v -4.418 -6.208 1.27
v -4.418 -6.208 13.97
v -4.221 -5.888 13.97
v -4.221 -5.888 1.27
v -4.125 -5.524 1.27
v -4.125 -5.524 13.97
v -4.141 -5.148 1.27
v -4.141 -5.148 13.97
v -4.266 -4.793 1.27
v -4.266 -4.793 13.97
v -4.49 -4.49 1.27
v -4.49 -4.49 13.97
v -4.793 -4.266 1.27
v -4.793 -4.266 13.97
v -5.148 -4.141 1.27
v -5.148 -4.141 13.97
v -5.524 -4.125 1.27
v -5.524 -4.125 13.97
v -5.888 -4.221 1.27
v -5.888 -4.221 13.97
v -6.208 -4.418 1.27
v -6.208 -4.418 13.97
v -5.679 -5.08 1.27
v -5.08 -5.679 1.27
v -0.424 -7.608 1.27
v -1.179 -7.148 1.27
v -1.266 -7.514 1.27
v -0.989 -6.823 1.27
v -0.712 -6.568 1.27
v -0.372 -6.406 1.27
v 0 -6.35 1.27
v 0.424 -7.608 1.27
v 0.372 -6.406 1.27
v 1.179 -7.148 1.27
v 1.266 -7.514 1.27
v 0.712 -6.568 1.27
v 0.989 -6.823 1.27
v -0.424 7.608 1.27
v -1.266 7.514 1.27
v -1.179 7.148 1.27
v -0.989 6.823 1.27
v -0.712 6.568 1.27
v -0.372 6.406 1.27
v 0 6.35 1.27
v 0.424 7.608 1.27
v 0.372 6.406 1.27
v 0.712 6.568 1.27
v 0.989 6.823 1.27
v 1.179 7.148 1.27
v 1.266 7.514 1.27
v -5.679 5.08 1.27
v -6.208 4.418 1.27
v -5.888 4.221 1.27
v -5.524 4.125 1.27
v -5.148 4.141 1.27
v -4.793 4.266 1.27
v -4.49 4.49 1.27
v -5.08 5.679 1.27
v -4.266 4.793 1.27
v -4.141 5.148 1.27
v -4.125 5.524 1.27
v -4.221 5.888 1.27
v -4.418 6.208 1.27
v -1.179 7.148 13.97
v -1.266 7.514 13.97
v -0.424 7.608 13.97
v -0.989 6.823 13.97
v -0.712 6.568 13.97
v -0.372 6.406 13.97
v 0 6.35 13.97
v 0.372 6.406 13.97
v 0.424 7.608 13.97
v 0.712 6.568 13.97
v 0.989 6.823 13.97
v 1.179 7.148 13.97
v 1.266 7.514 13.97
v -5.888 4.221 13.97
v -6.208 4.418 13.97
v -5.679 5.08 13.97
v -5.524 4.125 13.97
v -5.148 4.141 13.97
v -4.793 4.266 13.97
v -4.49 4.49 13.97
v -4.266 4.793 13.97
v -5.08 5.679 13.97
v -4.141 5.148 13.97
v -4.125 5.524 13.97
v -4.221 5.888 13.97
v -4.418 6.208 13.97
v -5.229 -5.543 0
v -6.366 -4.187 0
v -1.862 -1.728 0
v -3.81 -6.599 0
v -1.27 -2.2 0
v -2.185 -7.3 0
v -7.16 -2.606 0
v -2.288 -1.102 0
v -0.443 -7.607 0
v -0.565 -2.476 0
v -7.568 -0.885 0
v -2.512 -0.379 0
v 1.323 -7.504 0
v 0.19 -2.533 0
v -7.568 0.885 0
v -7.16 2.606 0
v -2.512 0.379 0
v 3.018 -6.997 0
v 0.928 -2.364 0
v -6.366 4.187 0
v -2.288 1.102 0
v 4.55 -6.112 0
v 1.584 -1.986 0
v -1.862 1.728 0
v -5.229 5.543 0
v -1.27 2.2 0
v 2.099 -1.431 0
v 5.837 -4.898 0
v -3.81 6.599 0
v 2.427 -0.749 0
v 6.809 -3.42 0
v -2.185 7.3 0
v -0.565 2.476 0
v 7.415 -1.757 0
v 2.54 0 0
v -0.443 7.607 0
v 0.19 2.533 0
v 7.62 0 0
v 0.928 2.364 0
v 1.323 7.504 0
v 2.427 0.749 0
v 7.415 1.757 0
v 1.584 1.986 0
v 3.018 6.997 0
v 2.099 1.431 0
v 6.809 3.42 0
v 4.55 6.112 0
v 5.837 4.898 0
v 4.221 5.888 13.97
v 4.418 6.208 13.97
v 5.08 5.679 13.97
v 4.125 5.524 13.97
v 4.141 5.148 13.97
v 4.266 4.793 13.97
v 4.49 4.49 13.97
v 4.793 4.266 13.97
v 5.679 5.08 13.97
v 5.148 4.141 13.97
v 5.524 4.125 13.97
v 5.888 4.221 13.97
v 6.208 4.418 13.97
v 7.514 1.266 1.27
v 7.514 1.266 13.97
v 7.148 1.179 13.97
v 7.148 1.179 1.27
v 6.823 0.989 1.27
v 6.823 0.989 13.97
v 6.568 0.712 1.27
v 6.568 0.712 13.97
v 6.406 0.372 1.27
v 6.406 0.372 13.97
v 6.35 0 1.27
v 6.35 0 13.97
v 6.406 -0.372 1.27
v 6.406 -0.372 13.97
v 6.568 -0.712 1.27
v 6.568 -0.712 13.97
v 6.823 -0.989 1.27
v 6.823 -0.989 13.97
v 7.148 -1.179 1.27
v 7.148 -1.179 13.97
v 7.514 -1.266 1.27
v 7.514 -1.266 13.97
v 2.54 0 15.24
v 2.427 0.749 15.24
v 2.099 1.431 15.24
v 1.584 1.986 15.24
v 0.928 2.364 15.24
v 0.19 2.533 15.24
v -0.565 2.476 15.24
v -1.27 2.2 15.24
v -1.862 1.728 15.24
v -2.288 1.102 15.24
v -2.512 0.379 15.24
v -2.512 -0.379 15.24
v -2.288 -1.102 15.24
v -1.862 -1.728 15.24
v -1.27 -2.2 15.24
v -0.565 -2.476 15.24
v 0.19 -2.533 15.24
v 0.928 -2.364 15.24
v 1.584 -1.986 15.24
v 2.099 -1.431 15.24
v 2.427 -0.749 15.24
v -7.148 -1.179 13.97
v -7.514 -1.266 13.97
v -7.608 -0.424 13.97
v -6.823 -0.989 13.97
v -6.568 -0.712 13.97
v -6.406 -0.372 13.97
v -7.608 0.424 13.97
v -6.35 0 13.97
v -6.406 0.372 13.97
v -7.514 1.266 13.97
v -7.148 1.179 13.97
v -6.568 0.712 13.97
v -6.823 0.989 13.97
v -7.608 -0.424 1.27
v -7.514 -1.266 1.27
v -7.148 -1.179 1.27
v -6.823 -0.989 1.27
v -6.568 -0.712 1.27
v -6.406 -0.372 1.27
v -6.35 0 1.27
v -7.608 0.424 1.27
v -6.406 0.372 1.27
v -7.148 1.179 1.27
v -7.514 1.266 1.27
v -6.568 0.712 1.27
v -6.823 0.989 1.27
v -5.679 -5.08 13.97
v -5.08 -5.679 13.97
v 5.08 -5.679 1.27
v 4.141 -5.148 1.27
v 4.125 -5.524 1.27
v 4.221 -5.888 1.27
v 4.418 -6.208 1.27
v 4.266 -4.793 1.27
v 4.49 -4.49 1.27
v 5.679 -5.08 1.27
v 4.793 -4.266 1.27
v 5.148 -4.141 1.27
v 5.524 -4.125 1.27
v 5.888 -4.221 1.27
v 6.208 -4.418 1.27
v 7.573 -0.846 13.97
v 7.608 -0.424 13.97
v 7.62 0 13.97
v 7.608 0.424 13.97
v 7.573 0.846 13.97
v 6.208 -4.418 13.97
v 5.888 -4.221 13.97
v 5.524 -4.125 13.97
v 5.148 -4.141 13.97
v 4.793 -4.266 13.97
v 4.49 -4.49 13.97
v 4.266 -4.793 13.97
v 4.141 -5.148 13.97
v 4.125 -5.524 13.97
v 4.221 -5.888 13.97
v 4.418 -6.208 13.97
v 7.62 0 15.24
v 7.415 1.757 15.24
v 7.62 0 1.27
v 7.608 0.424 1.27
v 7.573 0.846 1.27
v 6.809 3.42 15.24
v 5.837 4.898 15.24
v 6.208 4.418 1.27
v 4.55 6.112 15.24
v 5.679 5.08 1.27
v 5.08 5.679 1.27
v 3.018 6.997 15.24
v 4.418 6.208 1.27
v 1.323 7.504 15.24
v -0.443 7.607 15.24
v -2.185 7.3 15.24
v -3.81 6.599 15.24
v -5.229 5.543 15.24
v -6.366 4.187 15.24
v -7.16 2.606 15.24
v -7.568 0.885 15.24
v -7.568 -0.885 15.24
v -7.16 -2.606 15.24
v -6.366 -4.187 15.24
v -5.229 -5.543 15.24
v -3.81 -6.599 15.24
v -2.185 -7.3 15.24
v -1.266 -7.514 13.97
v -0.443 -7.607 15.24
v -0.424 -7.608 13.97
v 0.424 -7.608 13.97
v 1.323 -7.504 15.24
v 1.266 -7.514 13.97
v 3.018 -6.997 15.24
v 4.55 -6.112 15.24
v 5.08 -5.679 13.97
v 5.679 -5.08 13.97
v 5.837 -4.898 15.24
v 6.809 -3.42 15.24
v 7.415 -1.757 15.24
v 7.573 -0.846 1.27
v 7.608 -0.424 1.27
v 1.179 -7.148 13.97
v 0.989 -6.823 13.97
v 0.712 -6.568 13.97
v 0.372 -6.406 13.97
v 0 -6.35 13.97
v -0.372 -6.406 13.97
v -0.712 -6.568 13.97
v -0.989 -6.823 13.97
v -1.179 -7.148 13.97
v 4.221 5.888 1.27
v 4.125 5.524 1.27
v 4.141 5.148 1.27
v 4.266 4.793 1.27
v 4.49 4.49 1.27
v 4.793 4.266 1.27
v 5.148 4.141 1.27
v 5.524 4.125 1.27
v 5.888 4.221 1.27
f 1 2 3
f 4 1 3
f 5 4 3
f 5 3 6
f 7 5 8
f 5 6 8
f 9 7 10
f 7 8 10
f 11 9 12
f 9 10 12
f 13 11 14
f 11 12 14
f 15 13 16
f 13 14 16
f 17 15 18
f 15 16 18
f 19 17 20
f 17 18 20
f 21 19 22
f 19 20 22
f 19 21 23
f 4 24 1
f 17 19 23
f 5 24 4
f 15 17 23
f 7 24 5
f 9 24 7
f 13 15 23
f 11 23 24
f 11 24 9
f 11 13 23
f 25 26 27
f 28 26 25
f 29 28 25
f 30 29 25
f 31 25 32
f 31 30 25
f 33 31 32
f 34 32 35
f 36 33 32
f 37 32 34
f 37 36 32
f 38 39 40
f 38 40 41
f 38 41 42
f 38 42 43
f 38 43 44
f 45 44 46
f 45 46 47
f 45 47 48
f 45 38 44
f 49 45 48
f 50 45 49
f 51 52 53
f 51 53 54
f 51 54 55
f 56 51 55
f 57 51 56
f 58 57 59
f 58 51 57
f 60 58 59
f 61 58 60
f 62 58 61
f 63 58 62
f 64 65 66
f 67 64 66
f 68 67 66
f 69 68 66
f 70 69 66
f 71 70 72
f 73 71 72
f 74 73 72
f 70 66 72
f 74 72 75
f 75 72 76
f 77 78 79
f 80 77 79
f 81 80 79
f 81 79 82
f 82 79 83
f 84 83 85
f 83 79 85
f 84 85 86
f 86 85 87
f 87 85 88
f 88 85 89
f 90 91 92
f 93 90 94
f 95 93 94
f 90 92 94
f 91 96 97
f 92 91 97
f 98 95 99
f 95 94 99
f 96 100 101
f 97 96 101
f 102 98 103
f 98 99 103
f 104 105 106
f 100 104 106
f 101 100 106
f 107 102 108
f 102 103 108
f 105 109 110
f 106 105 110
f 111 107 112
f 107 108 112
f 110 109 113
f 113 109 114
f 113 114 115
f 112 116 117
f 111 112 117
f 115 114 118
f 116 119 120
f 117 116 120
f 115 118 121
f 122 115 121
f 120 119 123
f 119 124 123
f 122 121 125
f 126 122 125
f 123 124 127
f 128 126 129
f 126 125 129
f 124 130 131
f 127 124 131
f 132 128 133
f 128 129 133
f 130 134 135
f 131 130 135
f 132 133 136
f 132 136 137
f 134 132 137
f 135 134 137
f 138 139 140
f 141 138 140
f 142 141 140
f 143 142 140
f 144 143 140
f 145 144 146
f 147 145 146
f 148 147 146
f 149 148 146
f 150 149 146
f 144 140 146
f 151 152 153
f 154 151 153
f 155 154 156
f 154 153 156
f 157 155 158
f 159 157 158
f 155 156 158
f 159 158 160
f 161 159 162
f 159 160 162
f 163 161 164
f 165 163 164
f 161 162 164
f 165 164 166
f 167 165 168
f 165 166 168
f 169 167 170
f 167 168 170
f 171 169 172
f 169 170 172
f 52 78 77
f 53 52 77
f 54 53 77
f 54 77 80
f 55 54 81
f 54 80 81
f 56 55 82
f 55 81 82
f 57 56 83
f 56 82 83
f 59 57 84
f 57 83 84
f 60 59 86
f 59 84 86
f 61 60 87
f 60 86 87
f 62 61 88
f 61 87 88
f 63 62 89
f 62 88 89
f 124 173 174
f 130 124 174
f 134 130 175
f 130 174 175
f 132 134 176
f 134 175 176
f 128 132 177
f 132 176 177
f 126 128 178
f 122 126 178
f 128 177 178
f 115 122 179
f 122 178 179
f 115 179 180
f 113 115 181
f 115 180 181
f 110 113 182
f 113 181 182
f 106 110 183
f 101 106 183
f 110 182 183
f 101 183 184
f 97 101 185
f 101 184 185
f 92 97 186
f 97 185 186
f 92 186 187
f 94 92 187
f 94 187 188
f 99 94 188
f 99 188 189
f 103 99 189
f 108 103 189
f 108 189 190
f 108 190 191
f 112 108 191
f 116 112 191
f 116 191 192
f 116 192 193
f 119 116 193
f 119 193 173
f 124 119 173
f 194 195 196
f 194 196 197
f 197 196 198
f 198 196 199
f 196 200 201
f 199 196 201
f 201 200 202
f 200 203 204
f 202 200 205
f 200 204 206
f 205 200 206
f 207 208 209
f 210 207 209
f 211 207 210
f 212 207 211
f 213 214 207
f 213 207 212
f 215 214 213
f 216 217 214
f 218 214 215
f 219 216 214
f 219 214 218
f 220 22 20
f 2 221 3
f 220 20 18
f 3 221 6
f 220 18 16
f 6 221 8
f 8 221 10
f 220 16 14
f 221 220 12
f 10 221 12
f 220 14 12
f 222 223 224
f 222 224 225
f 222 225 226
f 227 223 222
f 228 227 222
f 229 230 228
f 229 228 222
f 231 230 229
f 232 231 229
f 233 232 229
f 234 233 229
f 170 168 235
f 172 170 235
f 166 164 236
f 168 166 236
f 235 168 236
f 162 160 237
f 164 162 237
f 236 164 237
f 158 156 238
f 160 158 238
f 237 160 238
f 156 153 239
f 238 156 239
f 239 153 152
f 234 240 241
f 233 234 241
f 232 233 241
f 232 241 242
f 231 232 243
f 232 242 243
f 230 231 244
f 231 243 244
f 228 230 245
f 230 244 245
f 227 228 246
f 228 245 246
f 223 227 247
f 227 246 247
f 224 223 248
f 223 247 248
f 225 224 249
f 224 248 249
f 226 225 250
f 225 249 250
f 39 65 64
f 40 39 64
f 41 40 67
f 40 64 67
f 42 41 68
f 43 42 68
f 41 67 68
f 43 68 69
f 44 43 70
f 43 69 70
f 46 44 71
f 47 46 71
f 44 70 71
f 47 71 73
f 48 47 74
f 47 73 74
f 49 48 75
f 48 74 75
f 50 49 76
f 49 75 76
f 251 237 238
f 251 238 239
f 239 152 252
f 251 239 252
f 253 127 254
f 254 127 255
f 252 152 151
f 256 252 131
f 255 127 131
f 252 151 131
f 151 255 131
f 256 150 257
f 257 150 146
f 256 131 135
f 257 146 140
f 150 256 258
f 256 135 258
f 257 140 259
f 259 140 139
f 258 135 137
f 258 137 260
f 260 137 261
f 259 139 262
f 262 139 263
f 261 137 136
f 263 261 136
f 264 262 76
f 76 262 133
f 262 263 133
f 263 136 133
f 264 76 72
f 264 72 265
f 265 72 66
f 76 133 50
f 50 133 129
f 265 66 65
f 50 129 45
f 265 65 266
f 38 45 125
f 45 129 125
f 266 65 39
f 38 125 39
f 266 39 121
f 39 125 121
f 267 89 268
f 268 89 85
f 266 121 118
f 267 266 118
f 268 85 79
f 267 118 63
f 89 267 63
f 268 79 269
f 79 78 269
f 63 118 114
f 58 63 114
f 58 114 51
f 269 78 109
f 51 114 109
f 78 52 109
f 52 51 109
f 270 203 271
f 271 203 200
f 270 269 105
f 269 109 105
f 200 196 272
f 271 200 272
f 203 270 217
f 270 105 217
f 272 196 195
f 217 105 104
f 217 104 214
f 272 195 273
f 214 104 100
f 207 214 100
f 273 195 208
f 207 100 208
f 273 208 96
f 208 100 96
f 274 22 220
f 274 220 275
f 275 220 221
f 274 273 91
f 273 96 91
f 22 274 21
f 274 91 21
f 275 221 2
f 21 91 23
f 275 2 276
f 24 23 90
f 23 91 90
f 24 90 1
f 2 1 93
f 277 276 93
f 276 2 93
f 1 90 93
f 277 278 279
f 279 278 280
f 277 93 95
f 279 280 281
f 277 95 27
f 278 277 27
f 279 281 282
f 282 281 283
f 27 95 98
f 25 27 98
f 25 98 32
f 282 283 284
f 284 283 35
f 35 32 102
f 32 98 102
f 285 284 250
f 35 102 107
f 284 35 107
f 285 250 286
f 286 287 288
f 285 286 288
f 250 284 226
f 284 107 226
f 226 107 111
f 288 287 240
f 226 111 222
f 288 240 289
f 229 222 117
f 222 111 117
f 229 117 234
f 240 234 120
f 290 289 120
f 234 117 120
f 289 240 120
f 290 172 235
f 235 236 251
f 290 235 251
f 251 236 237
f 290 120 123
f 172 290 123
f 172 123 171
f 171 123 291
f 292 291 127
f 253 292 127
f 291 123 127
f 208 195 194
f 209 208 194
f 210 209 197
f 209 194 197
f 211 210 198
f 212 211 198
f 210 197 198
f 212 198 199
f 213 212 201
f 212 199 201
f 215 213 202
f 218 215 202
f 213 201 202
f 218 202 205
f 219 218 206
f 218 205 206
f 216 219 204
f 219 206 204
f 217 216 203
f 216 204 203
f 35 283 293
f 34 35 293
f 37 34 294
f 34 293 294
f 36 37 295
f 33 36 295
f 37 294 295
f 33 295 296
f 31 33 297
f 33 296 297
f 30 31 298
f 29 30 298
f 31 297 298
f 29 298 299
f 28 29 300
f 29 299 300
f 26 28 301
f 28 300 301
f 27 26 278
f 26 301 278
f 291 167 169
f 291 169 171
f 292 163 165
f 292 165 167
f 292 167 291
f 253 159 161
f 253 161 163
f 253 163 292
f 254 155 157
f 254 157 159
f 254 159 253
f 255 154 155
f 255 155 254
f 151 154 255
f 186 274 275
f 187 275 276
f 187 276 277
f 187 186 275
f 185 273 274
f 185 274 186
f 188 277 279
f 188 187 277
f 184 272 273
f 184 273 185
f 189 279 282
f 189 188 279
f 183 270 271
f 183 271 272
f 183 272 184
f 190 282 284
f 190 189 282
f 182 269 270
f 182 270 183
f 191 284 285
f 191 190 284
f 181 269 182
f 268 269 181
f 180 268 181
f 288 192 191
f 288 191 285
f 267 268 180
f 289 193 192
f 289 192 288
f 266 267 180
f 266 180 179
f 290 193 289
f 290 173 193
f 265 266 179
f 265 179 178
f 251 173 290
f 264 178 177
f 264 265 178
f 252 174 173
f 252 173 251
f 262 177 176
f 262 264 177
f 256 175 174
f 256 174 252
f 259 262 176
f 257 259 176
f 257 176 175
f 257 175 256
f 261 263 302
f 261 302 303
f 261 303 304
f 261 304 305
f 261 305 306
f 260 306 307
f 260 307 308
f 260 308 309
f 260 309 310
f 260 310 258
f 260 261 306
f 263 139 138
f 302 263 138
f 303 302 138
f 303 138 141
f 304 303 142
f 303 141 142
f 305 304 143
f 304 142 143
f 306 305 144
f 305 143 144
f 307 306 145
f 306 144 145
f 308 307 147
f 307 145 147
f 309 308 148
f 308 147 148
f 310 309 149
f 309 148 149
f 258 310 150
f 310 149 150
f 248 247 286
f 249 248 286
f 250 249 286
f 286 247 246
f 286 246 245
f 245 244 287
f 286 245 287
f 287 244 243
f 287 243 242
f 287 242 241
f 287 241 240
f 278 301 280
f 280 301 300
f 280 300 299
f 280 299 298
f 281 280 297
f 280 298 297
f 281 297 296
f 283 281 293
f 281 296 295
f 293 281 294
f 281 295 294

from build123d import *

# Parameters (mm, degrees)
SKETCH015_R     = 7.62
PAD005_DEPTH    = 15.24
POCKET010_DEPTH = 12.7
SKETCH017_R     = 2.54
POCKET011_DEPTH = 15.241


with BuildPart() as part:
    # Sketch015 → Pad005 (new body)
    with BuildSketch(Plane.XY):
        Circle(SKETCH015_R)
    extrude(amount=PAD005_DEPTH)

    # Sketch016 (on DatumPlane) → Pocket010 (cut)
    with BuildSketch(Plane.XY.offset(13.97)):
        with BuildLine():
            ThreePointArc((-1.265583, 7.514167), (0, 6.35), (1.265583, 7.514167))
            ThreePointArc((1.265583, 7.514167), (0, 7.62), (-1.265583, 7.514167))
        make_face()
        with BuildLine():
            ThreePointArc((7.514167, 1.265583), (6.35, 0), (7.514167, -1.265583))
            ThreePointArc((7.514167, -1.265583), (7.62, 0), (7.514167, 1.265583))
        make_face()
        with BuildLine():
            ThreePointArc((1.265583, -7.514167), (0, -6.35), (-1.265583, -7.514167))
            ThreePointArc((-1.265583, -7.514167), (0, -7.62), (1.265583, -7.514167))
        make_face()
        with BuildLine():
            ThreePointArc((-7.514167, -1.265583), (-6.35, 0), (-7.514167, 1.265583))
            ThreePointArc((-7.514167, 1.265583), (-7.62, 0), (-7.514167, -1.265583))
        make_face()
        with BuildLine():
            ThreePointArc((-6.20822, 4.418416), (-4.490128, 4.490128), (-4.418416, 6.20822))
            ThreePointArc((-4.418416, 6.20822), (-5.388154, 5.388154), (-6.20822, 4.418416))
        make_face()
        with BuildLine():
            ThreePointArc((4.418416, 6.20822), (4.490128, 4.490128), (6.20822, 4.418416))
            ThreePointArc((6.20822, 4.418416), (5.388154, 5.388154), (4.418416, 6.20822))
        make_face()
        with BuildLine():
            ThreePointArc((6.20822, -4.418416), (4.490128, -4.490128), (4.418416, -6.20822))
            ThreePointArc((4.418416, -6.20822), (5.388154, -5.388154), (6.20822, -4.418416))
        make_face()
        with BuildLine():
            ThreePointArc((-4.418416, -6.20822), (-4.490128, -4.490128), (-6.20822, -4.418416))
            ThreePointArc((-6.20822, -4.418416), (-5.388154, -5.388154), (-4.418416, -6.20822))
        make_face()
    extrude(amount=-POCKET010_DEPTH, mode=Mode.SUBTRACT)

    # Sketch017 (on Face6 of Pocket010) → Pocket011 (cut, through all)
    with BuildSketch(Plane.XY.offset(15.24)):
        Circle(SKETCH017_R)
    extrude(amount=-POCKET011_DEPTH, mode=Mode.SUBTRACT)


solid = part.part
